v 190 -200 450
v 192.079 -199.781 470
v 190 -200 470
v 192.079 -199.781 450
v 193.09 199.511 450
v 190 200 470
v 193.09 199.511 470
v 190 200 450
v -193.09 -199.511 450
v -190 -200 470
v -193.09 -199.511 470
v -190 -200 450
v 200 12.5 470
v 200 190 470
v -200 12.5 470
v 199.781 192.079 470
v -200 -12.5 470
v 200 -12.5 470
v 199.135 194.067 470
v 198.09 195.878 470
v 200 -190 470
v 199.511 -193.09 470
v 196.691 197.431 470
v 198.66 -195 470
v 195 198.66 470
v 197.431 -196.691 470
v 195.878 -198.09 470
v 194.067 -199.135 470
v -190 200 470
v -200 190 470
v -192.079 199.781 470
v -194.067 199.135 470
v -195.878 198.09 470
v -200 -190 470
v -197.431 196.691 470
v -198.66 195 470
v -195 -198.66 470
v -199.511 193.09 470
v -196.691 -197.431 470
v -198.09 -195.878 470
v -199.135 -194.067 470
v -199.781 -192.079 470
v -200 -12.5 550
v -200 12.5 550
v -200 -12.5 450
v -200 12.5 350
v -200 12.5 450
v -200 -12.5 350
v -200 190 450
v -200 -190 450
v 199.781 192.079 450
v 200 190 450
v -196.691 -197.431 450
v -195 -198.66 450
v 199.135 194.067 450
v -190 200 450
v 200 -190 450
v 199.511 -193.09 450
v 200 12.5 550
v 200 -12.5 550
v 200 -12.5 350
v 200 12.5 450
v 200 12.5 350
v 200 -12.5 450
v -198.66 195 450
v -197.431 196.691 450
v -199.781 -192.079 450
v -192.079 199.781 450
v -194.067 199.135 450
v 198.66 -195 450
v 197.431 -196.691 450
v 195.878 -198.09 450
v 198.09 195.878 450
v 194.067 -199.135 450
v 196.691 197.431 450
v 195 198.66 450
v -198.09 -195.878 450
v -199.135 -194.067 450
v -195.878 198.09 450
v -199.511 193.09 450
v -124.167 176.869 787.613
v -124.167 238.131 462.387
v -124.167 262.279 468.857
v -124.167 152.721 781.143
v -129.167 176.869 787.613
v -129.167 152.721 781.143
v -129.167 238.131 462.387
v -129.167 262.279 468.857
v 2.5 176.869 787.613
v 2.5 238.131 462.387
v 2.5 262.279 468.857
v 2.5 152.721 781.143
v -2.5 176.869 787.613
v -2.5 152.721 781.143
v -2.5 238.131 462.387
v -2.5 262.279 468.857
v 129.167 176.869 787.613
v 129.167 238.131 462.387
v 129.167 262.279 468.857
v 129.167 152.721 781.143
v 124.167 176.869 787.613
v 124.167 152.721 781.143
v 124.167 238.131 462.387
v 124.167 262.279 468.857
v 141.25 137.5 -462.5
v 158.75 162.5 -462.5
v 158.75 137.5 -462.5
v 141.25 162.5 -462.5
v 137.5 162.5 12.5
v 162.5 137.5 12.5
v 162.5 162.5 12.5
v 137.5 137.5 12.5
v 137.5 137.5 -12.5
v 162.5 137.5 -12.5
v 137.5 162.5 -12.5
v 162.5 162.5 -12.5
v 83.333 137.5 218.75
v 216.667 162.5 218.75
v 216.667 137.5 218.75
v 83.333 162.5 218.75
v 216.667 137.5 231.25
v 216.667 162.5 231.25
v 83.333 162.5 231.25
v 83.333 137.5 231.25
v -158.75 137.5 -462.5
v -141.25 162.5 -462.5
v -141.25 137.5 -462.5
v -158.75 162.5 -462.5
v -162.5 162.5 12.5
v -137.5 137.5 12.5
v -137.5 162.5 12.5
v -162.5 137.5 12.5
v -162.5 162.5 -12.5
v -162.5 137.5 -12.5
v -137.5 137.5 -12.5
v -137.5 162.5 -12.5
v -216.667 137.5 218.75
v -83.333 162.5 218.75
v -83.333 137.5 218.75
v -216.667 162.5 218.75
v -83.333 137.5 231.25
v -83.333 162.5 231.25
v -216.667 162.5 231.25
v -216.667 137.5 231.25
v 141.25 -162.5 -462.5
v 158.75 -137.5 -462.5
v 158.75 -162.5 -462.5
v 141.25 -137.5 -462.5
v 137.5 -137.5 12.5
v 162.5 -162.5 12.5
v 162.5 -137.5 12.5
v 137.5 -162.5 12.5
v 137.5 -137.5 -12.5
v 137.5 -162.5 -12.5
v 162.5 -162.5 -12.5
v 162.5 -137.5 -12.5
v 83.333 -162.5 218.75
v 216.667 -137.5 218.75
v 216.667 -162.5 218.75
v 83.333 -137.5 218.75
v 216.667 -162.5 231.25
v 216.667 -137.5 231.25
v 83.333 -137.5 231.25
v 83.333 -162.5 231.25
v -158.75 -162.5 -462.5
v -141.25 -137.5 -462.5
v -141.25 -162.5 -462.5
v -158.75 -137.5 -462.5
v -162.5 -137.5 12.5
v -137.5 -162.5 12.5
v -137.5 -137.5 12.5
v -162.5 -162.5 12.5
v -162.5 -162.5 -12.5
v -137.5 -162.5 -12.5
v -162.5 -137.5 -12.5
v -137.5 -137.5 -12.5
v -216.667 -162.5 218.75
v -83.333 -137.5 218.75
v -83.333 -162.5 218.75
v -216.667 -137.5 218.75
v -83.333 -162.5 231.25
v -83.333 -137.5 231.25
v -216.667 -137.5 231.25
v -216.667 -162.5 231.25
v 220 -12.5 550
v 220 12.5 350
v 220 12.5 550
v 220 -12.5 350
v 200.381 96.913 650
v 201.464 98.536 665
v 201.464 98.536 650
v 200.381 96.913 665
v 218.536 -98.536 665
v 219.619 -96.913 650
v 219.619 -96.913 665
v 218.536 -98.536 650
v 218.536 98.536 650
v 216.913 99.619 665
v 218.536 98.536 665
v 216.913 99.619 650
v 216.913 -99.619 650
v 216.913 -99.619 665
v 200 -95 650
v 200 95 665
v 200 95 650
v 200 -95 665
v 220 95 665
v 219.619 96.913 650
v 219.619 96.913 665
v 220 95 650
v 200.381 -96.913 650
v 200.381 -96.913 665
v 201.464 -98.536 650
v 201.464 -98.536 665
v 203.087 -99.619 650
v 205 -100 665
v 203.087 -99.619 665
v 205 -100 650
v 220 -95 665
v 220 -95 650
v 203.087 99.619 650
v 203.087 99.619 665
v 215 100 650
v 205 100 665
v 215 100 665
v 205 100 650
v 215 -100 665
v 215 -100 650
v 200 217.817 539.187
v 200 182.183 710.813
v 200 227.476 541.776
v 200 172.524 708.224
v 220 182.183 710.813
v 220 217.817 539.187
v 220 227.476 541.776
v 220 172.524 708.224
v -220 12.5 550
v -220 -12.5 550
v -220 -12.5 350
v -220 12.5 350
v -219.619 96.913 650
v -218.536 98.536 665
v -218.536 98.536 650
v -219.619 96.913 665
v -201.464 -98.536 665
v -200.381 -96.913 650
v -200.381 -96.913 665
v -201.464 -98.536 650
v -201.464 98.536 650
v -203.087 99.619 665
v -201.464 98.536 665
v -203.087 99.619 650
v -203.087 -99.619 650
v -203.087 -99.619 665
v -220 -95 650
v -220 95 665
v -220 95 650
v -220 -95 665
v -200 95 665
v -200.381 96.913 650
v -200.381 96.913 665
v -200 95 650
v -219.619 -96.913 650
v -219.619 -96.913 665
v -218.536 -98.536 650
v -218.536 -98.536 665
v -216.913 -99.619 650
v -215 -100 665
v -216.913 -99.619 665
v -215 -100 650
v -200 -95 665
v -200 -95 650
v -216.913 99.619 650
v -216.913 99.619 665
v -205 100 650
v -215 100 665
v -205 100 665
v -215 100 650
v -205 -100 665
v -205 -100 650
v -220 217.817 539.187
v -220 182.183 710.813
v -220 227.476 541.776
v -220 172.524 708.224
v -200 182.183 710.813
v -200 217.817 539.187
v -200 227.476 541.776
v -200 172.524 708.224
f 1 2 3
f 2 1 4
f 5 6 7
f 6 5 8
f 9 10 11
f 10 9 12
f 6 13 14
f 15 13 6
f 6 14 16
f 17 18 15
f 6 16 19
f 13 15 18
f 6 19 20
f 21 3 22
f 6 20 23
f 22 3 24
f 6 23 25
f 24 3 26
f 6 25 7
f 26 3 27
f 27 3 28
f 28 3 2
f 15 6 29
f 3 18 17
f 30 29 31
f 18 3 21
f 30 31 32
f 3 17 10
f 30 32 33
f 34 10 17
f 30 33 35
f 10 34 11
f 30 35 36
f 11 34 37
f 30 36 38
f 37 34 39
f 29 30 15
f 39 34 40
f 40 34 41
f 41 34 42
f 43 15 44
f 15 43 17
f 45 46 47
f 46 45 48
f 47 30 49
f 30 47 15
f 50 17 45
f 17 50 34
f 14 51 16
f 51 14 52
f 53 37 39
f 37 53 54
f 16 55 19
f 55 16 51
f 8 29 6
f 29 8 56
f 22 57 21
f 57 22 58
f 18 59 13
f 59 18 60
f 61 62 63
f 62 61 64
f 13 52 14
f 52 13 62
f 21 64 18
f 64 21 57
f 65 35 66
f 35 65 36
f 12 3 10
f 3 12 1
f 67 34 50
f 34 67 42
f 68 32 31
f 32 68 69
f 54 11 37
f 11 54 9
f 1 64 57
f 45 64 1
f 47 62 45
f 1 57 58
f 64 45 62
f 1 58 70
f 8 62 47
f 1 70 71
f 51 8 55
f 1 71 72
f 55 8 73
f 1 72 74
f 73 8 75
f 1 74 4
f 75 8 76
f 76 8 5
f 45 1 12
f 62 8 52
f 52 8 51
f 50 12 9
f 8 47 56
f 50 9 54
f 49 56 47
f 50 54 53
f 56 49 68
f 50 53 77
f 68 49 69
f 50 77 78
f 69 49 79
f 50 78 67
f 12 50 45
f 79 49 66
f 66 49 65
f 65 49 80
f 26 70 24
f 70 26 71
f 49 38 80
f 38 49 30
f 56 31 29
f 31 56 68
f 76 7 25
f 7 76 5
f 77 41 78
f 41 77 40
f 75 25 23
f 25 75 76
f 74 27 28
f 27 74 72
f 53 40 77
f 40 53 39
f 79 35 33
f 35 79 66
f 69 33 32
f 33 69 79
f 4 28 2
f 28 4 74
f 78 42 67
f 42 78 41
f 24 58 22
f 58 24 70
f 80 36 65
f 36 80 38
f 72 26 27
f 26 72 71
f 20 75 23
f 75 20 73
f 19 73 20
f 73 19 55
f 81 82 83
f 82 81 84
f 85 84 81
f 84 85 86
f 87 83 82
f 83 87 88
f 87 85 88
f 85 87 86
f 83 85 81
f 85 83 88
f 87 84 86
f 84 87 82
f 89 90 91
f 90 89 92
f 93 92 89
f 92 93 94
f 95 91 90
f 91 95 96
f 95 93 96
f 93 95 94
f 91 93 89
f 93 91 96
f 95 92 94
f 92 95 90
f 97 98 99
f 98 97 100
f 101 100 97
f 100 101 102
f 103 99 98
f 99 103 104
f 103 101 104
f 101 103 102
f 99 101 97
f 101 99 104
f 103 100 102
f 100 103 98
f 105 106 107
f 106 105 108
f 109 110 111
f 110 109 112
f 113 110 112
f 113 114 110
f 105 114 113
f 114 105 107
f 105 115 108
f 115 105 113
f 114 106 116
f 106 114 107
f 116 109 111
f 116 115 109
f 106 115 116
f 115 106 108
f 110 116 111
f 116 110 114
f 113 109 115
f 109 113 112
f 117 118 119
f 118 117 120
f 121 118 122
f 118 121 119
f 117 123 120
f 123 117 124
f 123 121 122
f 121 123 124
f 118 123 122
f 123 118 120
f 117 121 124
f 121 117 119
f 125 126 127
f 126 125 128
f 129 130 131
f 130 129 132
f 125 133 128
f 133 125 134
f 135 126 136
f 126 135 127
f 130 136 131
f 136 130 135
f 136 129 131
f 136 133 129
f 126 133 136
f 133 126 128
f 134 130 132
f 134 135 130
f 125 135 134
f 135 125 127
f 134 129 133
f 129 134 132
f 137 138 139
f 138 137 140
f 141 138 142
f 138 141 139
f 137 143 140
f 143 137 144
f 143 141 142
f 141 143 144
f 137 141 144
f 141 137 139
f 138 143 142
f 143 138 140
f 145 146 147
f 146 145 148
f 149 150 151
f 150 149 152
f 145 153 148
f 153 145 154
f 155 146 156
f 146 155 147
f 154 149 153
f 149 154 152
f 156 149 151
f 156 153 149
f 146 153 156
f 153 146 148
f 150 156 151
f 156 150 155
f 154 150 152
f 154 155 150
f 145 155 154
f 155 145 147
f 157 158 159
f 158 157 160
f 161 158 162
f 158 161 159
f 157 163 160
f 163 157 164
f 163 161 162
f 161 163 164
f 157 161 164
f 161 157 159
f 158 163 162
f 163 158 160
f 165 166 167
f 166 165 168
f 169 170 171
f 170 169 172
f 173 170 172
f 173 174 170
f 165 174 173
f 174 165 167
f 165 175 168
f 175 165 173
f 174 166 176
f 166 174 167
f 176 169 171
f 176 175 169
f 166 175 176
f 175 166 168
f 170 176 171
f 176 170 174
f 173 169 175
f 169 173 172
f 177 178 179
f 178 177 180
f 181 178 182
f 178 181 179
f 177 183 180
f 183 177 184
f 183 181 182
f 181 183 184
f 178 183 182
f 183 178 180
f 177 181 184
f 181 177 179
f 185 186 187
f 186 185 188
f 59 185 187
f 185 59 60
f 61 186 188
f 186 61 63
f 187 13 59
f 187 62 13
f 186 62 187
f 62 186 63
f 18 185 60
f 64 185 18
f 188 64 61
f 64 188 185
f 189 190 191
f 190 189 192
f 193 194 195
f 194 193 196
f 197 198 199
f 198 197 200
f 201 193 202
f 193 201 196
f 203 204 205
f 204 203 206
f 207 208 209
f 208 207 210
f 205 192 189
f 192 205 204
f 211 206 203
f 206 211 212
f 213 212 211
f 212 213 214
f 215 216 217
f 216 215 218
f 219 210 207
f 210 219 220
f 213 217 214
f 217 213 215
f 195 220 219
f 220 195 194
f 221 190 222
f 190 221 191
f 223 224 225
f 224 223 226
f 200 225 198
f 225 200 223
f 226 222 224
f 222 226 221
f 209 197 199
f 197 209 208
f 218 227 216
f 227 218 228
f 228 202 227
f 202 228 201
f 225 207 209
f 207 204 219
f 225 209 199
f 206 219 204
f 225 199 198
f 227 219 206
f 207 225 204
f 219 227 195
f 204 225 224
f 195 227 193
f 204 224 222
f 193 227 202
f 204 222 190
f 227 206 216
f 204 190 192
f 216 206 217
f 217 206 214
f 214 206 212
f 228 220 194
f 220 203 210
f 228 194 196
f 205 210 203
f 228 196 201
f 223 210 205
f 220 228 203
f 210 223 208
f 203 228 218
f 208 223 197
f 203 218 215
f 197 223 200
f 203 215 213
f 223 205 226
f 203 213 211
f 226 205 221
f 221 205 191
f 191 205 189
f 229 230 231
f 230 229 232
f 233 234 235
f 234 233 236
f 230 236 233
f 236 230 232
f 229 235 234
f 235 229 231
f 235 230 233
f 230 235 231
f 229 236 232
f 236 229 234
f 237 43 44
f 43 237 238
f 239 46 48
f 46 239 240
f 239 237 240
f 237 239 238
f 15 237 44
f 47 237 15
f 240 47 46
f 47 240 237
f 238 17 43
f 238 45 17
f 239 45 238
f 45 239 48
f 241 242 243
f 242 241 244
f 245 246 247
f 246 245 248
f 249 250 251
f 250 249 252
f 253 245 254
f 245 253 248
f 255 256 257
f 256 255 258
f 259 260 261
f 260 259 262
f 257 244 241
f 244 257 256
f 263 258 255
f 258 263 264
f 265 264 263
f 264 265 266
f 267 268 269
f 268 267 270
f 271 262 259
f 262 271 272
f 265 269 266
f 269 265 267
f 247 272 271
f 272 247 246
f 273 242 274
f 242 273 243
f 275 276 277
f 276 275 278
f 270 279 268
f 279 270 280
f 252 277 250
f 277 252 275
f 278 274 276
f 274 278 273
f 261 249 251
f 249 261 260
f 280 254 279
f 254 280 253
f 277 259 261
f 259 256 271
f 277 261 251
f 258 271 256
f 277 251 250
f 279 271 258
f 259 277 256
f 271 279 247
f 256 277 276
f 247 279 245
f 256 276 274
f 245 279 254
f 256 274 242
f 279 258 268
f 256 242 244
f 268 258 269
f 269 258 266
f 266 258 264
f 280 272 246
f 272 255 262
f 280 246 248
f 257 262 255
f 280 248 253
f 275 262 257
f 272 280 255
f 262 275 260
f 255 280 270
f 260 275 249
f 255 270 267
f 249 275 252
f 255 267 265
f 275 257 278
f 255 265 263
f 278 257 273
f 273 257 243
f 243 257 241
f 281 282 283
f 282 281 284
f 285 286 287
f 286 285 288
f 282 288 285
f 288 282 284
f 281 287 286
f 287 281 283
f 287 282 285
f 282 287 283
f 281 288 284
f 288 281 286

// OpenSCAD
// VibeCAD Chair Design
// A modern, ergonomic chair with configurable dimensions
// HackHarvard 2025

// ===== CONFIGURABLE PARAMETERS =====
// Chair dimensions (in mm)
seat_width = 400;           // Width of the seat
seat_depth = 400;           // Depth of the seat
seat_height = 450;          // Height from floor to seat
seat_thickness = 20;        // Thickness of seat cushion

backrest_height = 350;      // Height of backrest
backrest_width = 380;       // Width of backrest
backrest_thickness = 15;    // Thickness of backrest
backrest_angle = 15;        // Backrest angle in degrees

leg_thickness = 25;         // Thickness of chair legs
leg_spread = 50;            // How much legs spread out at bottom

armrest_height = 200;       // Height of armrests from seat
armrest_length = 200;       // Length of armrests
armrest_thickness = 20;     // Thickness of armrests

// Design parameters
corner_radius = 10;         // Radius for rounded corners
leg_taper = 0.7;            // Leg taper ratio (1.0 = no taper)

// ===== MODULES =====

// Rounded rectangle module
module rounded_rect(width, height, thickness, radius) {
    linear_extrude(height = thickness) {
        offset(r = radius) {
            square([width - 2*radius, height - 2*radius], center = true);
        }
    }
}

// Tapered leg module
module chair_leg(length, top_width, bottom_width, thickness) {
    hull() {
        // Top of leg
        translate([0, 0, 0])
            cube([top_width, thickness, thickness], center = true);
        // Bottom of leg
        translate([0, 0, -length])
            cube([bottom_width, thickness, thickness], center = true);
    }
}

// Seat module
module seat() {
    // Main seat
    translate([0, 0, seat_height]) {
        rounded_rect(seat_width, seat_depth, seat_thickness, corner_radius);
        
        // Seat cushion texture (optional)
        for (i = [-seat_width/3 : seat_width/6 : seat_width/3]) {
            for (j = [-seat_depth/3 : seat_depth/6 : seat_depth/3]) {
                translate([i, j, seat_thickness/2]) {
                    cylinder(h = 2, r = 3, center = true);
                }
            }
        }
    }
}

// Backrest module
module backrest() {
    translate([0, seat_depth/2 + backrest_thickness/2, seat_height + backrest_height/2]) {
        rotate([backrest_angle, 0, 0]) {
            rounded_rect(backrest_width, backrest_thickness, backrest_height, corner_radius);
            
            // Backrest support bars
            for (i = [-backrest_width/3 : backrest_width/3 : backrest_width/3]) {
                translate([i, 0, 0]) {
                    cube([5, backrest_thickness + 10, backrest_height - 20], center = true);
                }
            }
        }
    }
}

// Leg assembly module
module legs() {
    leg_positions = [
        [seat_width/2 - leg_spread, seat_depth/2 - leg_spread],
        [-seat_width/2 + leg_spread, seat_depth/2 - leg_spread],
        [seat_width/2 - leg_spread, -seat_depth/2 + leg_spread],
        [-seat_width/2 + leg_spread, -seat_depth/2 + leg_spread]
    ];
    
    for (pos = leg_positions) {
        translate([pos[0], pos[1], 0]) {
            // Main leg
            chair_leg(seat_height, leg_thickness, leg_thickness * leg_taper, leg_thickness);
            
            // Cross brace for stability
            translate([0, 0, seat_height/2]) {
                rotate([0, 90, 0]) {
                    cube([leg_thickness/2, leg_thickness, seat_width/3], center = true);
                }
            }
        }
    }
}

// Armrest module
module armrests() {
    armrest_positions = [
        [seat_width/2 + armrest_thickness/2, 0],
        [-seat_width/2 - armrest_thickness/2, 0]
    ];
    
    for (pos = armrest_positions) {
        translate([pos[0], pos[1], seat_height + armrest_height/2]) {
            // Armrest support
            translate([0, 0, -armrest_height/2]) {
                cube([armrest_thickness, leg_thickness, armrest_height], center = true);
            }
            
            // Armrest top
            translate([0, 0, armrest_height/2]) {
                rounded_rect(armrest_thickness, armrest_length, 15, 5);
            }
            
            // Armrest connection to backrest
            translate([0, seat_depth/2, backrest_height/2 - armrest_height/2]) {
                rotate([backrest_angle, 0, 0]) {
                    cube([armrest_thickness, 10, backrest_height/2], center = true);
                }
            }
        }
    }
}

// Footrest module (optional)
module footrest() {
    translate([0, seat_depth/2 + 100, 200]) {
        rounded_rect(seat_width - 100, 200, 15, corner_radius);
    }
}

// ===== MAIN ASSEMBLY =====
module chair() {
    // Core components
    seat();
    backrest();
    legs();
    armrests();
    
    // Optional footrest (uncomment if desired)
    // footrest();
}

// ===== RENDERING =====
// Uncomment the component you want to render

// Full chair
chair();

// Individual components for testing (uncomment as needed)
// seat();
// backrest();
// legs();
// armrests();

// ===== EXPORT SETTINGS =====
// For high-quality STL export, use these settings in OpenSCAD:
// - File > Export > Export as STL
// - Set resolution to 0.1 or lower for smooth curves
// - Enable "Open File" to view the exported STL

// ===== CUSTOMIZATION NOTES =====
// To customize the chair:
// 1. Adjust the parameters at the top of the file
// 2. Modify the leg_taper for different leg styles
// 3. Change corner_radius for more/less rounded corners
// 4. Adjust backrest_angle for different seating positions
// 5. Uncomment footrest() for a footrest version
// 6. Modify the cushion texture pattern in the seat module
